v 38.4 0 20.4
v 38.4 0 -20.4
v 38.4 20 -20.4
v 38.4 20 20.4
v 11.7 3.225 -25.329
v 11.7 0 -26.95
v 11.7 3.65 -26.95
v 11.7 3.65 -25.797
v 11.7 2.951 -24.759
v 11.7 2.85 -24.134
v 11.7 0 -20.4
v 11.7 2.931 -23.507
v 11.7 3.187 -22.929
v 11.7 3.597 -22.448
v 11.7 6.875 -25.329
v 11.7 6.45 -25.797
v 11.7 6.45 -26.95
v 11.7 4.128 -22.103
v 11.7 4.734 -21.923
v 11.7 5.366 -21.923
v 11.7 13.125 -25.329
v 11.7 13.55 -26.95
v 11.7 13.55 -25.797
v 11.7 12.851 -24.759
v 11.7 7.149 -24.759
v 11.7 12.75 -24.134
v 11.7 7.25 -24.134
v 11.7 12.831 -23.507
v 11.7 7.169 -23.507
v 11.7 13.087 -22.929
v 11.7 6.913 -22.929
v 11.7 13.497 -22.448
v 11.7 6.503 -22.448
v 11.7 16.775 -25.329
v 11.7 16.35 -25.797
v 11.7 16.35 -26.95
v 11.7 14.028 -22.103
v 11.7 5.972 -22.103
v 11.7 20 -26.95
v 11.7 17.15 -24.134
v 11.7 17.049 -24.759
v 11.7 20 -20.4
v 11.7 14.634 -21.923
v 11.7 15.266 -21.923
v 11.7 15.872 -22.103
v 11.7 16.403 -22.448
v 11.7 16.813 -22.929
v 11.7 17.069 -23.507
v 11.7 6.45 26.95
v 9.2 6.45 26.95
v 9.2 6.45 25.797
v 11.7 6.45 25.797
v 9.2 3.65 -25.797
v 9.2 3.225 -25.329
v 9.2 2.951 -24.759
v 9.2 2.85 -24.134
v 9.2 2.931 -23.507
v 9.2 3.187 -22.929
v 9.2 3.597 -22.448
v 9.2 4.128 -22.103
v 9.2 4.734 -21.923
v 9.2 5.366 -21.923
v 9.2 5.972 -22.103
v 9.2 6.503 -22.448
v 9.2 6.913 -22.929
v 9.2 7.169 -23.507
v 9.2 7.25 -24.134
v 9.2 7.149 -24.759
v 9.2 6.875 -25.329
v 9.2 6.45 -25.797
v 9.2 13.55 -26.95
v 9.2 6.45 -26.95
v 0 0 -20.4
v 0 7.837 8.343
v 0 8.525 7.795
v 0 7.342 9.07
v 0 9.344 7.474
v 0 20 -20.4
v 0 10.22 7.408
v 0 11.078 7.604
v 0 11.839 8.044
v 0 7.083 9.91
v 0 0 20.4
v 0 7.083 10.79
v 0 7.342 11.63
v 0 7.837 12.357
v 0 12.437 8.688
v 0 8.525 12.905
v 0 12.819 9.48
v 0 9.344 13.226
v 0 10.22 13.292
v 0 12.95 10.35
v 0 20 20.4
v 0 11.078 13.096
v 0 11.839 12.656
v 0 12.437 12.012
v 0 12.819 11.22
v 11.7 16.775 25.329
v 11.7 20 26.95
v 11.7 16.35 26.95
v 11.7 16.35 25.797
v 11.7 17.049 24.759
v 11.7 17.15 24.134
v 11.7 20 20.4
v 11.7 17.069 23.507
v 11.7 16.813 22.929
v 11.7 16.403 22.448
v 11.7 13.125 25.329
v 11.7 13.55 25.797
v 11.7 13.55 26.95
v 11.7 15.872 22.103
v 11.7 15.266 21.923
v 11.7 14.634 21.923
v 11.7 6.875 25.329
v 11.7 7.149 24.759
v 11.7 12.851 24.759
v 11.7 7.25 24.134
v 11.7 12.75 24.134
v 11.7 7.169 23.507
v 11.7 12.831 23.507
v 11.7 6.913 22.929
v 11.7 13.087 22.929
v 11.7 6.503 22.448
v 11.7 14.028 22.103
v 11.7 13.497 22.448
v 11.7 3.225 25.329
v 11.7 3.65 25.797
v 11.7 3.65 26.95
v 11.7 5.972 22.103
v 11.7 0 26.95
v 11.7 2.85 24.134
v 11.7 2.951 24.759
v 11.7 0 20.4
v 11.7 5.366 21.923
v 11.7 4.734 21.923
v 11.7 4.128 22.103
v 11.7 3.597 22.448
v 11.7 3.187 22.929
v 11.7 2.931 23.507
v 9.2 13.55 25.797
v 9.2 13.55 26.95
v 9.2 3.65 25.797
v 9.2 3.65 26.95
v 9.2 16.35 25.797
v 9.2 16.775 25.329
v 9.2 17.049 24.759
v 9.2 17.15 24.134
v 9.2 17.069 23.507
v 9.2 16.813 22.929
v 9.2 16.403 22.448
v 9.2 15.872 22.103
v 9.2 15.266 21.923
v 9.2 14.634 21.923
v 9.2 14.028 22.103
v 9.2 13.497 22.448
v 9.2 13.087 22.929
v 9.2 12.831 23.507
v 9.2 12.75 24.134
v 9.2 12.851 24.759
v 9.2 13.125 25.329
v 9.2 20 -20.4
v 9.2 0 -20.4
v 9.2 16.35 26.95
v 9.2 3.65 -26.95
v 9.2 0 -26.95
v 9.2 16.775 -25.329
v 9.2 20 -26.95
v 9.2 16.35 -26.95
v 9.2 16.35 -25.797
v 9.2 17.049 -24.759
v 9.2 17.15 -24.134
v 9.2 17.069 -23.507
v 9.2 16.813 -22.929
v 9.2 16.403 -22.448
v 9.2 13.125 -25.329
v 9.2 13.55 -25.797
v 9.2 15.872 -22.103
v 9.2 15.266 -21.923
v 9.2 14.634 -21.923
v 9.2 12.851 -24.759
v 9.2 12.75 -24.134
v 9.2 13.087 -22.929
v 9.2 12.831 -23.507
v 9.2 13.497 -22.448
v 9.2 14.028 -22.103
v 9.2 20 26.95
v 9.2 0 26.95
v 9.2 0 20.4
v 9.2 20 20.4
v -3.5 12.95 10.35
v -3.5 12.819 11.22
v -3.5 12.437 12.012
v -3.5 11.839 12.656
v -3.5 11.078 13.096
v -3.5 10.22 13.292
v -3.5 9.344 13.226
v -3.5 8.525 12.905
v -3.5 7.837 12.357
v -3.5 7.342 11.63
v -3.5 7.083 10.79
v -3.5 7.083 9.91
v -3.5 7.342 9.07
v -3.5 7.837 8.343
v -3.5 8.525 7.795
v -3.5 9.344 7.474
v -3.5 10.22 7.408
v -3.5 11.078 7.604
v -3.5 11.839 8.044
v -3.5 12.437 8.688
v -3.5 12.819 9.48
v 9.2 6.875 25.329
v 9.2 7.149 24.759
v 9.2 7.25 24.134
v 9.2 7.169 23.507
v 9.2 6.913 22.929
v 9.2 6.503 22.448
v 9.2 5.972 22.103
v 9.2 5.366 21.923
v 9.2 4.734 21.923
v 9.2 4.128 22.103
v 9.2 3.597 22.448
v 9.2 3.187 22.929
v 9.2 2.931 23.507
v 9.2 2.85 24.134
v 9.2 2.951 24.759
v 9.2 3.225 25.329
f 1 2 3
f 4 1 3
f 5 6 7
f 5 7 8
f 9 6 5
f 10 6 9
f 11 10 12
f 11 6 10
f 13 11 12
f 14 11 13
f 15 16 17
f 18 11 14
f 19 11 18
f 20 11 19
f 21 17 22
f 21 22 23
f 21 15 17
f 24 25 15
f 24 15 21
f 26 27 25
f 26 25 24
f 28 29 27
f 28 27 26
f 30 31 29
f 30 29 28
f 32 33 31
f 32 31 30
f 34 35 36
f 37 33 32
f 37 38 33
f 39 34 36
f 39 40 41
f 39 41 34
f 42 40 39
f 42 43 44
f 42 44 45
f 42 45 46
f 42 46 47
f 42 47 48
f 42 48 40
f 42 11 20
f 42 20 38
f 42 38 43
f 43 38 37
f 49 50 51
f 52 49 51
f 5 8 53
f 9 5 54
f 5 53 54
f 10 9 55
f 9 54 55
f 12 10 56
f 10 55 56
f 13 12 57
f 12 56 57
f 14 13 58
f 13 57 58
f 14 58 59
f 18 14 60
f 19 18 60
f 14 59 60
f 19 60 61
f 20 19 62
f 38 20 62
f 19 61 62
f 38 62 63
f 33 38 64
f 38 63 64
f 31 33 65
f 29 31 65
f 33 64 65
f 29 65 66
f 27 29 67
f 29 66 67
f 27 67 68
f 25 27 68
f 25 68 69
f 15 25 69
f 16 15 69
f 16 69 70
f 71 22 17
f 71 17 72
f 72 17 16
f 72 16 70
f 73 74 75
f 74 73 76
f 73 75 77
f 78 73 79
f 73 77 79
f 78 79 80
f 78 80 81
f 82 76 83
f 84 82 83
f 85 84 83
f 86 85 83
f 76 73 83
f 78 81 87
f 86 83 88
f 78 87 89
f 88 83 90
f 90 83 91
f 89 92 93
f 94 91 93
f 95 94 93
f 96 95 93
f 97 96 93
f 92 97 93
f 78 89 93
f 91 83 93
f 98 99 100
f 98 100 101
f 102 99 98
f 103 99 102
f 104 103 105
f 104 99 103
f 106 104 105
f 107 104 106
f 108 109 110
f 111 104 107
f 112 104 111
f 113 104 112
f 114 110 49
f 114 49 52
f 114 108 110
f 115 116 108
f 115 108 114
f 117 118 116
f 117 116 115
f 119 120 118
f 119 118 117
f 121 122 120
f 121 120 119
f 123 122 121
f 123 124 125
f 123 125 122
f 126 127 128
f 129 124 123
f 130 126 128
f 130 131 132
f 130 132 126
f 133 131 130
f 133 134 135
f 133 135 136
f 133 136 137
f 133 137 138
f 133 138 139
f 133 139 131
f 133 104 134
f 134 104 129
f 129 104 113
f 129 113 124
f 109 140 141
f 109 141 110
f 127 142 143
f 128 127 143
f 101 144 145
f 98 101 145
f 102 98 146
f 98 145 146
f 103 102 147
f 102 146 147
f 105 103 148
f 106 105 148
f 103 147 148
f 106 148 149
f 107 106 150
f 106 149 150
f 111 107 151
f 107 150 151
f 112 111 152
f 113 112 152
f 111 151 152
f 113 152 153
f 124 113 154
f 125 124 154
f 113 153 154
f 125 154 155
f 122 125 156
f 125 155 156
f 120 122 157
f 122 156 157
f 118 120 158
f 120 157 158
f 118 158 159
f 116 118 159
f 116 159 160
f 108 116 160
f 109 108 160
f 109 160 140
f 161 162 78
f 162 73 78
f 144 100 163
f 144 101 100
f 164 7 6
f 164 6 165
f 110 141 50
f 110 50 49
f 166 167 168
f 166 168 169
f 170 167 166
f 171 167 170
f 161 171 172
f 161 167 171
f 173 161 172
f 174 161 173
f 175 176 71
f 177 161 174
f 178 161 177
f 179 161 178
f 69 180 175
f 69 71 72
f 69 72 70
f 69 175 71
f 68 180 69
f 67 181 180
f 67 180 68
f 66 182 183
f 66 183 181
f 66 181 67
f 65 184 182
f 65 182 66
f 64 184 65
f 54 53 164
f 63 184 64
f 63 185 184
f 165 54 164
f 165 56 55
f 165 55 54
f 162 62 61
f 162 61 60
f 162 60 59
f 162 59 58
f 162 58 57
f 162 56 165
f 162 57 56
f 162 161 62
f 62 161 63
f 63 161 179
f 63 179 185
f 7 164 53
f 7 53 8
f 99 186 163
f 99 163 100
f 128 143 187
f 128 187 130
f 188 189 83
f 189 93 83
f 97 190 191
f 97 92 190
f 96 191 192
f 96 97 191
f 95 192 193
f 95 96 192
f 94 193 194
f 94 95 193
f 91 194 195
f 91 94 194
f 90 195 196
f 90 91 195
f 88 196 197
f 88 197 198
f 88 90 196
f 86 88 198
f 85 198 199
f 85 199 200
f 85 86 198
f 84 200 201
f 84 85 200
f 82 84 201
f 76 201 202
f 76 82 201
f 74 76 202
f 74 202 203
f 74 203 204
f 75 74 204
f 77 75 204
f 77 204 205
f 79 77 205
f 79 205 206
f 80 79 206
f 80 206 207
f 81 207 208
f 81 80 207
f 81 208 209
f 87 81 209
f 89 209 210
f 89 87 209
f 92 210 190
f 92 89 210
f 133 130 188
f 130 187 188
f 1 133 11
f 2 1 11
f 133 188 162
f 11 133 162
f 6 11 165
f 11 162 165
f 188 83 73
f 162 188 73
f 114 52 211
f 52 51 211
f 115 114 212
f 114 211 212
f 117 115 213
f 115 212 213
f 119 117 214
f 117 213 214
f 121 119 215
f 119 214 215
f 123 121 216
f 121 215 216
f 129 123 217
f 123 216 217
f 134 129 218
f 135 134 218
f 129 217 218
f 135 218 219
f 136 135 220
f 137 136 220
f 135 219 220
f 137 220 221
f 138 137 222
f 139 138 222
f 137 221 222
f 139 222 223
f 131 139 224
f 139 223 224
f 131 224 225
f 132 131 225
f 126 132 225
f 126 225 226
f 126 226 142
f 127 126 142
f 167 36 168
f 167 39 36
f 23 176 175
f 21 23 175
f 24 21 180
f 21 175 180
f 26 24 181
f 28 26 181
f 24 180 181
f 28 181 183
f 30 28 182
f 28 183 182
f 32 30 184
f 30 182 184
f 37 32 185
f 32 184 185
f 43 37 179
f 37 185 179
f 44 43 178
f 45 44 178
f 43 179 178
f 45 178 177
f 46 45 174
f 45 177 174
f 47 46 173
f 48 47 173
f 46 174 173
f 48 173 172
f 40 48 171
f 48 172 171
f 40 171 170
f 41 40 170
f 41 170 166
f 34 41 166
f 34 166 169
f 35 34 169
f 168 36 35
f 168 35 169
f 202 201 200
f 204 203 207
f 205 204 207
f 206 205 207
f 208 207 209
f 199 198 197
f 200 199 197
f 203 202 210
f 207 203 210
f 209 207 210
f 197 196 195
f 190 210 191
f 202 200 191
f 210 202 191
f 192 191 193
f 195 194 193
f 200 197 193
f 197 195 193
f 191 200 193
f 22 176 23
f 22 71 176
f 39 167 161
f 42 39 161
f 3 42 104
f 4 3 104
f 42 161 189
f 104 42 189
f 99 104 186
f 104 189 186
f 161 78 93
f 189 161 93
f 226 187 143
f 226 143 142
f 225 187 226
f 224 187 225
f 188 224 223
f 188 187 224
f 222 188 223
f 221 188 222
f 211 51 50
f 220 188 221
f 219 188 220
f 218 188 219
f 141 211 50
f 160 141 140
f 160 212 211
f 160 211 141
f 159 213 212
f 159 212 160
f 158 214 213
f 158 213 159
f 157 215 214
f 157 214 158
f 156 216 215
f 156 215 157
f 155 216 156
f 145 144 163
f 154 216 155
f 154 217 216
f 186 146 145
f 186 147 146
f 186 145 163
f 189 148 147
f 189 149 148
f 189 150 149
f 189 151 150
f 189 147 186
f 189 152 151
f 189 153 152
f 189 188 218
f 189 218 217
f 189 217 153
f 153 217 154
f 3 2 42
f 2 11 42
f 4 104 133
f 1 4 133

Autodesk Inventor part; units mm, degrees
ref_plane "YZ Plane" through (0, 0, 0) normal (1, 0, 0) x (0, 1, 0)
ref_plane "XZ Plane" through (0, 0, 0) normal (0, 1, 0) x (-1, 0, 0)
sketch "Sketch1" plane through (0, 0, 0) normal (1, 0, 0) x (0, 1, 0)
  line L0 (20, 20.4) -> (0, 20.4)
  line L1 (0, 20.4) -> (0, -20.4)
  line L2 (0, -20.4) -> (20, -20.4)
  line L3 (20, -20.4) -> (20, 20.4)
  line L4 (0, -28.56) -> (0, 28.56) projected
  line L5 (-4, 0) -> (24, 0) projected
  point P0 (0, 0)
  dimension "d0" = 40.8
  dimension "d1" = 20
extrude "Extrusion1" add sketch "Sketch1" along normal blind 38.4
sketch "Sketch2" plane through (0, 0, 0) normal (1, 0, 0) x (0, 1, 0)
  line L0 (20, 20.4) -> (0, 20.4) projected
  line L1 (20, -20.4) -> (20, 20.4) projected
  line L2 (0, -20.4) -> (20, -20.4) projected
  line L3 (0, 20.4) -> (0, -20.4) projected
  line L4 (10, 20.4) -> (10, -20.4)
  line L5 (0, 20.4) -> (0, -20.4) projected
  circle A0 centre (10, 10.35) radius 2.95
  point P0 (0, 0)
  dimension "d4" = 5.9
  dimension "d40" = 10.05
extrude "Extrusion2" add sketch "Sketch2" against normal blind 3.5 contours A0 L4 | L4 A0
sketch "Sketch3" plane through (0, 0, 20.4) normal (0, 0, 1) x (1, 0, 0)
  line L0 (9.2, 20) -> (11.7, 20)
  line L1 (11.7, 20) -> (11.7, 0)
  line L2 (11.7, 0) -> (9.2, 0)
  line L3 (9.2, 0) -> (9.2, 20)
  line L4 (0, 20) -> (0, 0) projected
  line L5 (0, 0) -> (38.4, 0) projected
  line L6 (38.4, 20) -> (38.4, 0) projected
  line L7 (0, 20) -> (38.4, 20) projected
  point P0 (0, 0)
  dimension "d7" = 2.5
  dimension "d9" = 9.2
  dimension "d10" = 26.7
extrude "Extrusion3" add sketch "Sketch3" along normal blind 6.55 contours L0 L1 L2 L3
sketch "Sketch4" plane through (0, 0, -20.4) normal (0, 0, -1) x (-1, 0, 0)
  line L0 (-11.7, 20) -> (-9.2, 20)
  line L1 (-9.2, 20) -> (-9.2, 0)
  line L2 (-9.2, 0) -> (-11.7, 0)
  line L3 (-11.7, 0) -> (-11.7, 20)
  line L4 (0, 0) -> (0, 20) projected
  line L5 (0, 20) -> (-38.4, 20) projected
  line L6 (-38.4, 0) -> (-38.4, 20) projected
  line L7 (0, 0) -> (-38.4, 0) projected
  point P0 (0, 0)
  dimension "d13" = 2.5
  dimension "d14" = 9.2
  dimension "d15" = 26.7
extrude "Extrusion4" add sketch "Sketch4" along normal blind 6.55 contours L0 L1 L2 L3
sketch "Sketch5" plane through (9.2, 0, 20.4) normal (-1, 0, 0) x (0, 0, 1)
  circle A0 centre (-10.05, 10) radius 2.95 projected
  line L0 (0, 20) -> (0, 0) projected
  line L1 (-40.8, 20) -> (0, 20) projected
  line L2 (-40.8, 0) -> (-40.8, 20) projected
  line L3 (0, 0) -> (-40.8, 0) projected
  line L4 (0, 20) -> (0, 0) projected
  line L5 (0, 20) -> (6.55, 20) projected
  line L6 (6.55, 0) -> (6.55, 20) projected
  line L7 (0, 0) -> (6.55, 0) projected
  line L8 (-40.8, 0) -> (-40.8, 20) projected
  line L9 (-40.8, 0) -> (-47.35, 0) projected
  line L10 (-47.35, 20) -> (-47.35, 0) projected
  line L11 (-40.8, 20) -> (-47.35, 20) projected
  circle A1 centre (3.7, 14.95) radius 2.2
  arc A2 (5.3971, 6.45) -> (5.3971, 3.65) centre (3.7, 5.05) ccw
  circle A3 centre (-44.5, 14.95) radius 2.2
  circle A4 centre (-44.5, 5.05) radius 2.2
  line L12 (-47.35, 10) -> (6.55, 10) construction
  line L13 (-20.4, 0) -> (-20.4, 20) construction
  line L14 (6.55, 6.45) -> (5.3971, 6.45)
  line L15 (5.3971, 3.65) -> (6.55, 3.65)
  line L16 (6.55, 3.65) -> (6.55, 6.45)
  line L17 (3.7, 5.05) -> (6.55, 5.05) construction
  line L18 (3.7, 5.05) -> (3.7, 20) construction
  line L19 (-44.5, 5.05) -> (6.55, 5.05) construction
  point P0 (6.55, 3.65)
  point P1 (6.55, 6.45)
  dimension "d18" = 4.4
  dimension "d19" = 4.4
  dimension "d20" = 4.4
  dimension "d21" = 4.4
  dimension "d22" = 48.2
  dimension "d23" = 48.2
  dimension "d24" = 9.9
  dimension "d25" = 9.9
  dimension "d26" = 24.1
  dimension "d27" = 4.95
  dimension "d28" = 2.8
extrude "Extrusion5" cut sketch "Sketch5" against normal blind 6.55 contours L6 L15 A2 L14 | A1 | A3 | A4
ref_plane "Work Plane1" through (9.2, 14.95, 24.1) normal (0, 0, -1) x (1, 0, 0)
sketch "Sketch6" plane through (9.2, 14.95, 24.1) normal (0, 0, -1) x (1, 0, 0)
  line L0 (2.5, 2.2) -> (2.5, -2.2) projected
  line L1 (0, -2.2) -> (0, 2.2) projected
  line L2 (-21.08, 0) -> (37.58, 0) projected
  line L3 (0, -2.2) -> (2.5, -2.2) projected
  line L4 (0, 2.2) -> (2.5, 2.2) projected
  line L5 (0, 1.4) -> (2.5, 1.4)
  line L6 (2.5, 1.4) -> (2.5, -1.4)
  line L7 (2.5, -1.4) -> (0, -1.4)
  line L8 (0, -1.4) -> (0, 1.4)
  point P0 (-9.2, 14.95)
  point P1 (0, -1.4)
  point P2 (2.5, -1.4)
  point P3 (2.5, 1.4)
  point P4 (0, 1.4)
  dimension "d31" = 2.8
extrude "Extrusion6" cut sketch "Sketch6" against normal blind 6.55 contours L0 L2 L1 L5 | L0 L7 L1 L2
sketch "Sketch7" plane through (0, 0, -26.95) normal (0, 0, -1) x (-1, 0, 0)
  line L0 (-12.71, 16.35) -> (-7.7221, 16.35)
  line L1 (-7.7221, 16.35) -> (-7.7221, 13.55)
  line L2 (-7.7221, 13.55) -> (-12.71, 13.55)
  line L3 (-12.71, 13.55) -> (-12.71, 16.35)
  line L4 (-13.2403, 6.45) -> (-6.6781, 6.45)
  line L5 (-6.6781, 6.45) -> (-6.6781, 3.65)
  line L6 (-6.6781, 3.65) -> (-13.2403, 3.65)
  line L7 (-13.2403, 3.65) -> (-13.2403, 6.45)
  line L8 (11.88, 14.95) -> (-46.78, 14.95) projected
  line L9 (11.88, 5.05) -> (-46.78, 5.05) projected
  point P0 (0, 0)
  dimension "d34" = 2.8
  dimension "d35" = 2.8
extrude "Extrusion7" cut sketch "Sketch7" against normal up to surface contours L0 L1 L8 L3 | L8 L1 L2 L3
extrude "Extrusion8" cut sketch "Sketch7" against normal up to surface contours L4 L5 L9 L7 | L9 L5 L6 L7
properties part number "MG996R"
